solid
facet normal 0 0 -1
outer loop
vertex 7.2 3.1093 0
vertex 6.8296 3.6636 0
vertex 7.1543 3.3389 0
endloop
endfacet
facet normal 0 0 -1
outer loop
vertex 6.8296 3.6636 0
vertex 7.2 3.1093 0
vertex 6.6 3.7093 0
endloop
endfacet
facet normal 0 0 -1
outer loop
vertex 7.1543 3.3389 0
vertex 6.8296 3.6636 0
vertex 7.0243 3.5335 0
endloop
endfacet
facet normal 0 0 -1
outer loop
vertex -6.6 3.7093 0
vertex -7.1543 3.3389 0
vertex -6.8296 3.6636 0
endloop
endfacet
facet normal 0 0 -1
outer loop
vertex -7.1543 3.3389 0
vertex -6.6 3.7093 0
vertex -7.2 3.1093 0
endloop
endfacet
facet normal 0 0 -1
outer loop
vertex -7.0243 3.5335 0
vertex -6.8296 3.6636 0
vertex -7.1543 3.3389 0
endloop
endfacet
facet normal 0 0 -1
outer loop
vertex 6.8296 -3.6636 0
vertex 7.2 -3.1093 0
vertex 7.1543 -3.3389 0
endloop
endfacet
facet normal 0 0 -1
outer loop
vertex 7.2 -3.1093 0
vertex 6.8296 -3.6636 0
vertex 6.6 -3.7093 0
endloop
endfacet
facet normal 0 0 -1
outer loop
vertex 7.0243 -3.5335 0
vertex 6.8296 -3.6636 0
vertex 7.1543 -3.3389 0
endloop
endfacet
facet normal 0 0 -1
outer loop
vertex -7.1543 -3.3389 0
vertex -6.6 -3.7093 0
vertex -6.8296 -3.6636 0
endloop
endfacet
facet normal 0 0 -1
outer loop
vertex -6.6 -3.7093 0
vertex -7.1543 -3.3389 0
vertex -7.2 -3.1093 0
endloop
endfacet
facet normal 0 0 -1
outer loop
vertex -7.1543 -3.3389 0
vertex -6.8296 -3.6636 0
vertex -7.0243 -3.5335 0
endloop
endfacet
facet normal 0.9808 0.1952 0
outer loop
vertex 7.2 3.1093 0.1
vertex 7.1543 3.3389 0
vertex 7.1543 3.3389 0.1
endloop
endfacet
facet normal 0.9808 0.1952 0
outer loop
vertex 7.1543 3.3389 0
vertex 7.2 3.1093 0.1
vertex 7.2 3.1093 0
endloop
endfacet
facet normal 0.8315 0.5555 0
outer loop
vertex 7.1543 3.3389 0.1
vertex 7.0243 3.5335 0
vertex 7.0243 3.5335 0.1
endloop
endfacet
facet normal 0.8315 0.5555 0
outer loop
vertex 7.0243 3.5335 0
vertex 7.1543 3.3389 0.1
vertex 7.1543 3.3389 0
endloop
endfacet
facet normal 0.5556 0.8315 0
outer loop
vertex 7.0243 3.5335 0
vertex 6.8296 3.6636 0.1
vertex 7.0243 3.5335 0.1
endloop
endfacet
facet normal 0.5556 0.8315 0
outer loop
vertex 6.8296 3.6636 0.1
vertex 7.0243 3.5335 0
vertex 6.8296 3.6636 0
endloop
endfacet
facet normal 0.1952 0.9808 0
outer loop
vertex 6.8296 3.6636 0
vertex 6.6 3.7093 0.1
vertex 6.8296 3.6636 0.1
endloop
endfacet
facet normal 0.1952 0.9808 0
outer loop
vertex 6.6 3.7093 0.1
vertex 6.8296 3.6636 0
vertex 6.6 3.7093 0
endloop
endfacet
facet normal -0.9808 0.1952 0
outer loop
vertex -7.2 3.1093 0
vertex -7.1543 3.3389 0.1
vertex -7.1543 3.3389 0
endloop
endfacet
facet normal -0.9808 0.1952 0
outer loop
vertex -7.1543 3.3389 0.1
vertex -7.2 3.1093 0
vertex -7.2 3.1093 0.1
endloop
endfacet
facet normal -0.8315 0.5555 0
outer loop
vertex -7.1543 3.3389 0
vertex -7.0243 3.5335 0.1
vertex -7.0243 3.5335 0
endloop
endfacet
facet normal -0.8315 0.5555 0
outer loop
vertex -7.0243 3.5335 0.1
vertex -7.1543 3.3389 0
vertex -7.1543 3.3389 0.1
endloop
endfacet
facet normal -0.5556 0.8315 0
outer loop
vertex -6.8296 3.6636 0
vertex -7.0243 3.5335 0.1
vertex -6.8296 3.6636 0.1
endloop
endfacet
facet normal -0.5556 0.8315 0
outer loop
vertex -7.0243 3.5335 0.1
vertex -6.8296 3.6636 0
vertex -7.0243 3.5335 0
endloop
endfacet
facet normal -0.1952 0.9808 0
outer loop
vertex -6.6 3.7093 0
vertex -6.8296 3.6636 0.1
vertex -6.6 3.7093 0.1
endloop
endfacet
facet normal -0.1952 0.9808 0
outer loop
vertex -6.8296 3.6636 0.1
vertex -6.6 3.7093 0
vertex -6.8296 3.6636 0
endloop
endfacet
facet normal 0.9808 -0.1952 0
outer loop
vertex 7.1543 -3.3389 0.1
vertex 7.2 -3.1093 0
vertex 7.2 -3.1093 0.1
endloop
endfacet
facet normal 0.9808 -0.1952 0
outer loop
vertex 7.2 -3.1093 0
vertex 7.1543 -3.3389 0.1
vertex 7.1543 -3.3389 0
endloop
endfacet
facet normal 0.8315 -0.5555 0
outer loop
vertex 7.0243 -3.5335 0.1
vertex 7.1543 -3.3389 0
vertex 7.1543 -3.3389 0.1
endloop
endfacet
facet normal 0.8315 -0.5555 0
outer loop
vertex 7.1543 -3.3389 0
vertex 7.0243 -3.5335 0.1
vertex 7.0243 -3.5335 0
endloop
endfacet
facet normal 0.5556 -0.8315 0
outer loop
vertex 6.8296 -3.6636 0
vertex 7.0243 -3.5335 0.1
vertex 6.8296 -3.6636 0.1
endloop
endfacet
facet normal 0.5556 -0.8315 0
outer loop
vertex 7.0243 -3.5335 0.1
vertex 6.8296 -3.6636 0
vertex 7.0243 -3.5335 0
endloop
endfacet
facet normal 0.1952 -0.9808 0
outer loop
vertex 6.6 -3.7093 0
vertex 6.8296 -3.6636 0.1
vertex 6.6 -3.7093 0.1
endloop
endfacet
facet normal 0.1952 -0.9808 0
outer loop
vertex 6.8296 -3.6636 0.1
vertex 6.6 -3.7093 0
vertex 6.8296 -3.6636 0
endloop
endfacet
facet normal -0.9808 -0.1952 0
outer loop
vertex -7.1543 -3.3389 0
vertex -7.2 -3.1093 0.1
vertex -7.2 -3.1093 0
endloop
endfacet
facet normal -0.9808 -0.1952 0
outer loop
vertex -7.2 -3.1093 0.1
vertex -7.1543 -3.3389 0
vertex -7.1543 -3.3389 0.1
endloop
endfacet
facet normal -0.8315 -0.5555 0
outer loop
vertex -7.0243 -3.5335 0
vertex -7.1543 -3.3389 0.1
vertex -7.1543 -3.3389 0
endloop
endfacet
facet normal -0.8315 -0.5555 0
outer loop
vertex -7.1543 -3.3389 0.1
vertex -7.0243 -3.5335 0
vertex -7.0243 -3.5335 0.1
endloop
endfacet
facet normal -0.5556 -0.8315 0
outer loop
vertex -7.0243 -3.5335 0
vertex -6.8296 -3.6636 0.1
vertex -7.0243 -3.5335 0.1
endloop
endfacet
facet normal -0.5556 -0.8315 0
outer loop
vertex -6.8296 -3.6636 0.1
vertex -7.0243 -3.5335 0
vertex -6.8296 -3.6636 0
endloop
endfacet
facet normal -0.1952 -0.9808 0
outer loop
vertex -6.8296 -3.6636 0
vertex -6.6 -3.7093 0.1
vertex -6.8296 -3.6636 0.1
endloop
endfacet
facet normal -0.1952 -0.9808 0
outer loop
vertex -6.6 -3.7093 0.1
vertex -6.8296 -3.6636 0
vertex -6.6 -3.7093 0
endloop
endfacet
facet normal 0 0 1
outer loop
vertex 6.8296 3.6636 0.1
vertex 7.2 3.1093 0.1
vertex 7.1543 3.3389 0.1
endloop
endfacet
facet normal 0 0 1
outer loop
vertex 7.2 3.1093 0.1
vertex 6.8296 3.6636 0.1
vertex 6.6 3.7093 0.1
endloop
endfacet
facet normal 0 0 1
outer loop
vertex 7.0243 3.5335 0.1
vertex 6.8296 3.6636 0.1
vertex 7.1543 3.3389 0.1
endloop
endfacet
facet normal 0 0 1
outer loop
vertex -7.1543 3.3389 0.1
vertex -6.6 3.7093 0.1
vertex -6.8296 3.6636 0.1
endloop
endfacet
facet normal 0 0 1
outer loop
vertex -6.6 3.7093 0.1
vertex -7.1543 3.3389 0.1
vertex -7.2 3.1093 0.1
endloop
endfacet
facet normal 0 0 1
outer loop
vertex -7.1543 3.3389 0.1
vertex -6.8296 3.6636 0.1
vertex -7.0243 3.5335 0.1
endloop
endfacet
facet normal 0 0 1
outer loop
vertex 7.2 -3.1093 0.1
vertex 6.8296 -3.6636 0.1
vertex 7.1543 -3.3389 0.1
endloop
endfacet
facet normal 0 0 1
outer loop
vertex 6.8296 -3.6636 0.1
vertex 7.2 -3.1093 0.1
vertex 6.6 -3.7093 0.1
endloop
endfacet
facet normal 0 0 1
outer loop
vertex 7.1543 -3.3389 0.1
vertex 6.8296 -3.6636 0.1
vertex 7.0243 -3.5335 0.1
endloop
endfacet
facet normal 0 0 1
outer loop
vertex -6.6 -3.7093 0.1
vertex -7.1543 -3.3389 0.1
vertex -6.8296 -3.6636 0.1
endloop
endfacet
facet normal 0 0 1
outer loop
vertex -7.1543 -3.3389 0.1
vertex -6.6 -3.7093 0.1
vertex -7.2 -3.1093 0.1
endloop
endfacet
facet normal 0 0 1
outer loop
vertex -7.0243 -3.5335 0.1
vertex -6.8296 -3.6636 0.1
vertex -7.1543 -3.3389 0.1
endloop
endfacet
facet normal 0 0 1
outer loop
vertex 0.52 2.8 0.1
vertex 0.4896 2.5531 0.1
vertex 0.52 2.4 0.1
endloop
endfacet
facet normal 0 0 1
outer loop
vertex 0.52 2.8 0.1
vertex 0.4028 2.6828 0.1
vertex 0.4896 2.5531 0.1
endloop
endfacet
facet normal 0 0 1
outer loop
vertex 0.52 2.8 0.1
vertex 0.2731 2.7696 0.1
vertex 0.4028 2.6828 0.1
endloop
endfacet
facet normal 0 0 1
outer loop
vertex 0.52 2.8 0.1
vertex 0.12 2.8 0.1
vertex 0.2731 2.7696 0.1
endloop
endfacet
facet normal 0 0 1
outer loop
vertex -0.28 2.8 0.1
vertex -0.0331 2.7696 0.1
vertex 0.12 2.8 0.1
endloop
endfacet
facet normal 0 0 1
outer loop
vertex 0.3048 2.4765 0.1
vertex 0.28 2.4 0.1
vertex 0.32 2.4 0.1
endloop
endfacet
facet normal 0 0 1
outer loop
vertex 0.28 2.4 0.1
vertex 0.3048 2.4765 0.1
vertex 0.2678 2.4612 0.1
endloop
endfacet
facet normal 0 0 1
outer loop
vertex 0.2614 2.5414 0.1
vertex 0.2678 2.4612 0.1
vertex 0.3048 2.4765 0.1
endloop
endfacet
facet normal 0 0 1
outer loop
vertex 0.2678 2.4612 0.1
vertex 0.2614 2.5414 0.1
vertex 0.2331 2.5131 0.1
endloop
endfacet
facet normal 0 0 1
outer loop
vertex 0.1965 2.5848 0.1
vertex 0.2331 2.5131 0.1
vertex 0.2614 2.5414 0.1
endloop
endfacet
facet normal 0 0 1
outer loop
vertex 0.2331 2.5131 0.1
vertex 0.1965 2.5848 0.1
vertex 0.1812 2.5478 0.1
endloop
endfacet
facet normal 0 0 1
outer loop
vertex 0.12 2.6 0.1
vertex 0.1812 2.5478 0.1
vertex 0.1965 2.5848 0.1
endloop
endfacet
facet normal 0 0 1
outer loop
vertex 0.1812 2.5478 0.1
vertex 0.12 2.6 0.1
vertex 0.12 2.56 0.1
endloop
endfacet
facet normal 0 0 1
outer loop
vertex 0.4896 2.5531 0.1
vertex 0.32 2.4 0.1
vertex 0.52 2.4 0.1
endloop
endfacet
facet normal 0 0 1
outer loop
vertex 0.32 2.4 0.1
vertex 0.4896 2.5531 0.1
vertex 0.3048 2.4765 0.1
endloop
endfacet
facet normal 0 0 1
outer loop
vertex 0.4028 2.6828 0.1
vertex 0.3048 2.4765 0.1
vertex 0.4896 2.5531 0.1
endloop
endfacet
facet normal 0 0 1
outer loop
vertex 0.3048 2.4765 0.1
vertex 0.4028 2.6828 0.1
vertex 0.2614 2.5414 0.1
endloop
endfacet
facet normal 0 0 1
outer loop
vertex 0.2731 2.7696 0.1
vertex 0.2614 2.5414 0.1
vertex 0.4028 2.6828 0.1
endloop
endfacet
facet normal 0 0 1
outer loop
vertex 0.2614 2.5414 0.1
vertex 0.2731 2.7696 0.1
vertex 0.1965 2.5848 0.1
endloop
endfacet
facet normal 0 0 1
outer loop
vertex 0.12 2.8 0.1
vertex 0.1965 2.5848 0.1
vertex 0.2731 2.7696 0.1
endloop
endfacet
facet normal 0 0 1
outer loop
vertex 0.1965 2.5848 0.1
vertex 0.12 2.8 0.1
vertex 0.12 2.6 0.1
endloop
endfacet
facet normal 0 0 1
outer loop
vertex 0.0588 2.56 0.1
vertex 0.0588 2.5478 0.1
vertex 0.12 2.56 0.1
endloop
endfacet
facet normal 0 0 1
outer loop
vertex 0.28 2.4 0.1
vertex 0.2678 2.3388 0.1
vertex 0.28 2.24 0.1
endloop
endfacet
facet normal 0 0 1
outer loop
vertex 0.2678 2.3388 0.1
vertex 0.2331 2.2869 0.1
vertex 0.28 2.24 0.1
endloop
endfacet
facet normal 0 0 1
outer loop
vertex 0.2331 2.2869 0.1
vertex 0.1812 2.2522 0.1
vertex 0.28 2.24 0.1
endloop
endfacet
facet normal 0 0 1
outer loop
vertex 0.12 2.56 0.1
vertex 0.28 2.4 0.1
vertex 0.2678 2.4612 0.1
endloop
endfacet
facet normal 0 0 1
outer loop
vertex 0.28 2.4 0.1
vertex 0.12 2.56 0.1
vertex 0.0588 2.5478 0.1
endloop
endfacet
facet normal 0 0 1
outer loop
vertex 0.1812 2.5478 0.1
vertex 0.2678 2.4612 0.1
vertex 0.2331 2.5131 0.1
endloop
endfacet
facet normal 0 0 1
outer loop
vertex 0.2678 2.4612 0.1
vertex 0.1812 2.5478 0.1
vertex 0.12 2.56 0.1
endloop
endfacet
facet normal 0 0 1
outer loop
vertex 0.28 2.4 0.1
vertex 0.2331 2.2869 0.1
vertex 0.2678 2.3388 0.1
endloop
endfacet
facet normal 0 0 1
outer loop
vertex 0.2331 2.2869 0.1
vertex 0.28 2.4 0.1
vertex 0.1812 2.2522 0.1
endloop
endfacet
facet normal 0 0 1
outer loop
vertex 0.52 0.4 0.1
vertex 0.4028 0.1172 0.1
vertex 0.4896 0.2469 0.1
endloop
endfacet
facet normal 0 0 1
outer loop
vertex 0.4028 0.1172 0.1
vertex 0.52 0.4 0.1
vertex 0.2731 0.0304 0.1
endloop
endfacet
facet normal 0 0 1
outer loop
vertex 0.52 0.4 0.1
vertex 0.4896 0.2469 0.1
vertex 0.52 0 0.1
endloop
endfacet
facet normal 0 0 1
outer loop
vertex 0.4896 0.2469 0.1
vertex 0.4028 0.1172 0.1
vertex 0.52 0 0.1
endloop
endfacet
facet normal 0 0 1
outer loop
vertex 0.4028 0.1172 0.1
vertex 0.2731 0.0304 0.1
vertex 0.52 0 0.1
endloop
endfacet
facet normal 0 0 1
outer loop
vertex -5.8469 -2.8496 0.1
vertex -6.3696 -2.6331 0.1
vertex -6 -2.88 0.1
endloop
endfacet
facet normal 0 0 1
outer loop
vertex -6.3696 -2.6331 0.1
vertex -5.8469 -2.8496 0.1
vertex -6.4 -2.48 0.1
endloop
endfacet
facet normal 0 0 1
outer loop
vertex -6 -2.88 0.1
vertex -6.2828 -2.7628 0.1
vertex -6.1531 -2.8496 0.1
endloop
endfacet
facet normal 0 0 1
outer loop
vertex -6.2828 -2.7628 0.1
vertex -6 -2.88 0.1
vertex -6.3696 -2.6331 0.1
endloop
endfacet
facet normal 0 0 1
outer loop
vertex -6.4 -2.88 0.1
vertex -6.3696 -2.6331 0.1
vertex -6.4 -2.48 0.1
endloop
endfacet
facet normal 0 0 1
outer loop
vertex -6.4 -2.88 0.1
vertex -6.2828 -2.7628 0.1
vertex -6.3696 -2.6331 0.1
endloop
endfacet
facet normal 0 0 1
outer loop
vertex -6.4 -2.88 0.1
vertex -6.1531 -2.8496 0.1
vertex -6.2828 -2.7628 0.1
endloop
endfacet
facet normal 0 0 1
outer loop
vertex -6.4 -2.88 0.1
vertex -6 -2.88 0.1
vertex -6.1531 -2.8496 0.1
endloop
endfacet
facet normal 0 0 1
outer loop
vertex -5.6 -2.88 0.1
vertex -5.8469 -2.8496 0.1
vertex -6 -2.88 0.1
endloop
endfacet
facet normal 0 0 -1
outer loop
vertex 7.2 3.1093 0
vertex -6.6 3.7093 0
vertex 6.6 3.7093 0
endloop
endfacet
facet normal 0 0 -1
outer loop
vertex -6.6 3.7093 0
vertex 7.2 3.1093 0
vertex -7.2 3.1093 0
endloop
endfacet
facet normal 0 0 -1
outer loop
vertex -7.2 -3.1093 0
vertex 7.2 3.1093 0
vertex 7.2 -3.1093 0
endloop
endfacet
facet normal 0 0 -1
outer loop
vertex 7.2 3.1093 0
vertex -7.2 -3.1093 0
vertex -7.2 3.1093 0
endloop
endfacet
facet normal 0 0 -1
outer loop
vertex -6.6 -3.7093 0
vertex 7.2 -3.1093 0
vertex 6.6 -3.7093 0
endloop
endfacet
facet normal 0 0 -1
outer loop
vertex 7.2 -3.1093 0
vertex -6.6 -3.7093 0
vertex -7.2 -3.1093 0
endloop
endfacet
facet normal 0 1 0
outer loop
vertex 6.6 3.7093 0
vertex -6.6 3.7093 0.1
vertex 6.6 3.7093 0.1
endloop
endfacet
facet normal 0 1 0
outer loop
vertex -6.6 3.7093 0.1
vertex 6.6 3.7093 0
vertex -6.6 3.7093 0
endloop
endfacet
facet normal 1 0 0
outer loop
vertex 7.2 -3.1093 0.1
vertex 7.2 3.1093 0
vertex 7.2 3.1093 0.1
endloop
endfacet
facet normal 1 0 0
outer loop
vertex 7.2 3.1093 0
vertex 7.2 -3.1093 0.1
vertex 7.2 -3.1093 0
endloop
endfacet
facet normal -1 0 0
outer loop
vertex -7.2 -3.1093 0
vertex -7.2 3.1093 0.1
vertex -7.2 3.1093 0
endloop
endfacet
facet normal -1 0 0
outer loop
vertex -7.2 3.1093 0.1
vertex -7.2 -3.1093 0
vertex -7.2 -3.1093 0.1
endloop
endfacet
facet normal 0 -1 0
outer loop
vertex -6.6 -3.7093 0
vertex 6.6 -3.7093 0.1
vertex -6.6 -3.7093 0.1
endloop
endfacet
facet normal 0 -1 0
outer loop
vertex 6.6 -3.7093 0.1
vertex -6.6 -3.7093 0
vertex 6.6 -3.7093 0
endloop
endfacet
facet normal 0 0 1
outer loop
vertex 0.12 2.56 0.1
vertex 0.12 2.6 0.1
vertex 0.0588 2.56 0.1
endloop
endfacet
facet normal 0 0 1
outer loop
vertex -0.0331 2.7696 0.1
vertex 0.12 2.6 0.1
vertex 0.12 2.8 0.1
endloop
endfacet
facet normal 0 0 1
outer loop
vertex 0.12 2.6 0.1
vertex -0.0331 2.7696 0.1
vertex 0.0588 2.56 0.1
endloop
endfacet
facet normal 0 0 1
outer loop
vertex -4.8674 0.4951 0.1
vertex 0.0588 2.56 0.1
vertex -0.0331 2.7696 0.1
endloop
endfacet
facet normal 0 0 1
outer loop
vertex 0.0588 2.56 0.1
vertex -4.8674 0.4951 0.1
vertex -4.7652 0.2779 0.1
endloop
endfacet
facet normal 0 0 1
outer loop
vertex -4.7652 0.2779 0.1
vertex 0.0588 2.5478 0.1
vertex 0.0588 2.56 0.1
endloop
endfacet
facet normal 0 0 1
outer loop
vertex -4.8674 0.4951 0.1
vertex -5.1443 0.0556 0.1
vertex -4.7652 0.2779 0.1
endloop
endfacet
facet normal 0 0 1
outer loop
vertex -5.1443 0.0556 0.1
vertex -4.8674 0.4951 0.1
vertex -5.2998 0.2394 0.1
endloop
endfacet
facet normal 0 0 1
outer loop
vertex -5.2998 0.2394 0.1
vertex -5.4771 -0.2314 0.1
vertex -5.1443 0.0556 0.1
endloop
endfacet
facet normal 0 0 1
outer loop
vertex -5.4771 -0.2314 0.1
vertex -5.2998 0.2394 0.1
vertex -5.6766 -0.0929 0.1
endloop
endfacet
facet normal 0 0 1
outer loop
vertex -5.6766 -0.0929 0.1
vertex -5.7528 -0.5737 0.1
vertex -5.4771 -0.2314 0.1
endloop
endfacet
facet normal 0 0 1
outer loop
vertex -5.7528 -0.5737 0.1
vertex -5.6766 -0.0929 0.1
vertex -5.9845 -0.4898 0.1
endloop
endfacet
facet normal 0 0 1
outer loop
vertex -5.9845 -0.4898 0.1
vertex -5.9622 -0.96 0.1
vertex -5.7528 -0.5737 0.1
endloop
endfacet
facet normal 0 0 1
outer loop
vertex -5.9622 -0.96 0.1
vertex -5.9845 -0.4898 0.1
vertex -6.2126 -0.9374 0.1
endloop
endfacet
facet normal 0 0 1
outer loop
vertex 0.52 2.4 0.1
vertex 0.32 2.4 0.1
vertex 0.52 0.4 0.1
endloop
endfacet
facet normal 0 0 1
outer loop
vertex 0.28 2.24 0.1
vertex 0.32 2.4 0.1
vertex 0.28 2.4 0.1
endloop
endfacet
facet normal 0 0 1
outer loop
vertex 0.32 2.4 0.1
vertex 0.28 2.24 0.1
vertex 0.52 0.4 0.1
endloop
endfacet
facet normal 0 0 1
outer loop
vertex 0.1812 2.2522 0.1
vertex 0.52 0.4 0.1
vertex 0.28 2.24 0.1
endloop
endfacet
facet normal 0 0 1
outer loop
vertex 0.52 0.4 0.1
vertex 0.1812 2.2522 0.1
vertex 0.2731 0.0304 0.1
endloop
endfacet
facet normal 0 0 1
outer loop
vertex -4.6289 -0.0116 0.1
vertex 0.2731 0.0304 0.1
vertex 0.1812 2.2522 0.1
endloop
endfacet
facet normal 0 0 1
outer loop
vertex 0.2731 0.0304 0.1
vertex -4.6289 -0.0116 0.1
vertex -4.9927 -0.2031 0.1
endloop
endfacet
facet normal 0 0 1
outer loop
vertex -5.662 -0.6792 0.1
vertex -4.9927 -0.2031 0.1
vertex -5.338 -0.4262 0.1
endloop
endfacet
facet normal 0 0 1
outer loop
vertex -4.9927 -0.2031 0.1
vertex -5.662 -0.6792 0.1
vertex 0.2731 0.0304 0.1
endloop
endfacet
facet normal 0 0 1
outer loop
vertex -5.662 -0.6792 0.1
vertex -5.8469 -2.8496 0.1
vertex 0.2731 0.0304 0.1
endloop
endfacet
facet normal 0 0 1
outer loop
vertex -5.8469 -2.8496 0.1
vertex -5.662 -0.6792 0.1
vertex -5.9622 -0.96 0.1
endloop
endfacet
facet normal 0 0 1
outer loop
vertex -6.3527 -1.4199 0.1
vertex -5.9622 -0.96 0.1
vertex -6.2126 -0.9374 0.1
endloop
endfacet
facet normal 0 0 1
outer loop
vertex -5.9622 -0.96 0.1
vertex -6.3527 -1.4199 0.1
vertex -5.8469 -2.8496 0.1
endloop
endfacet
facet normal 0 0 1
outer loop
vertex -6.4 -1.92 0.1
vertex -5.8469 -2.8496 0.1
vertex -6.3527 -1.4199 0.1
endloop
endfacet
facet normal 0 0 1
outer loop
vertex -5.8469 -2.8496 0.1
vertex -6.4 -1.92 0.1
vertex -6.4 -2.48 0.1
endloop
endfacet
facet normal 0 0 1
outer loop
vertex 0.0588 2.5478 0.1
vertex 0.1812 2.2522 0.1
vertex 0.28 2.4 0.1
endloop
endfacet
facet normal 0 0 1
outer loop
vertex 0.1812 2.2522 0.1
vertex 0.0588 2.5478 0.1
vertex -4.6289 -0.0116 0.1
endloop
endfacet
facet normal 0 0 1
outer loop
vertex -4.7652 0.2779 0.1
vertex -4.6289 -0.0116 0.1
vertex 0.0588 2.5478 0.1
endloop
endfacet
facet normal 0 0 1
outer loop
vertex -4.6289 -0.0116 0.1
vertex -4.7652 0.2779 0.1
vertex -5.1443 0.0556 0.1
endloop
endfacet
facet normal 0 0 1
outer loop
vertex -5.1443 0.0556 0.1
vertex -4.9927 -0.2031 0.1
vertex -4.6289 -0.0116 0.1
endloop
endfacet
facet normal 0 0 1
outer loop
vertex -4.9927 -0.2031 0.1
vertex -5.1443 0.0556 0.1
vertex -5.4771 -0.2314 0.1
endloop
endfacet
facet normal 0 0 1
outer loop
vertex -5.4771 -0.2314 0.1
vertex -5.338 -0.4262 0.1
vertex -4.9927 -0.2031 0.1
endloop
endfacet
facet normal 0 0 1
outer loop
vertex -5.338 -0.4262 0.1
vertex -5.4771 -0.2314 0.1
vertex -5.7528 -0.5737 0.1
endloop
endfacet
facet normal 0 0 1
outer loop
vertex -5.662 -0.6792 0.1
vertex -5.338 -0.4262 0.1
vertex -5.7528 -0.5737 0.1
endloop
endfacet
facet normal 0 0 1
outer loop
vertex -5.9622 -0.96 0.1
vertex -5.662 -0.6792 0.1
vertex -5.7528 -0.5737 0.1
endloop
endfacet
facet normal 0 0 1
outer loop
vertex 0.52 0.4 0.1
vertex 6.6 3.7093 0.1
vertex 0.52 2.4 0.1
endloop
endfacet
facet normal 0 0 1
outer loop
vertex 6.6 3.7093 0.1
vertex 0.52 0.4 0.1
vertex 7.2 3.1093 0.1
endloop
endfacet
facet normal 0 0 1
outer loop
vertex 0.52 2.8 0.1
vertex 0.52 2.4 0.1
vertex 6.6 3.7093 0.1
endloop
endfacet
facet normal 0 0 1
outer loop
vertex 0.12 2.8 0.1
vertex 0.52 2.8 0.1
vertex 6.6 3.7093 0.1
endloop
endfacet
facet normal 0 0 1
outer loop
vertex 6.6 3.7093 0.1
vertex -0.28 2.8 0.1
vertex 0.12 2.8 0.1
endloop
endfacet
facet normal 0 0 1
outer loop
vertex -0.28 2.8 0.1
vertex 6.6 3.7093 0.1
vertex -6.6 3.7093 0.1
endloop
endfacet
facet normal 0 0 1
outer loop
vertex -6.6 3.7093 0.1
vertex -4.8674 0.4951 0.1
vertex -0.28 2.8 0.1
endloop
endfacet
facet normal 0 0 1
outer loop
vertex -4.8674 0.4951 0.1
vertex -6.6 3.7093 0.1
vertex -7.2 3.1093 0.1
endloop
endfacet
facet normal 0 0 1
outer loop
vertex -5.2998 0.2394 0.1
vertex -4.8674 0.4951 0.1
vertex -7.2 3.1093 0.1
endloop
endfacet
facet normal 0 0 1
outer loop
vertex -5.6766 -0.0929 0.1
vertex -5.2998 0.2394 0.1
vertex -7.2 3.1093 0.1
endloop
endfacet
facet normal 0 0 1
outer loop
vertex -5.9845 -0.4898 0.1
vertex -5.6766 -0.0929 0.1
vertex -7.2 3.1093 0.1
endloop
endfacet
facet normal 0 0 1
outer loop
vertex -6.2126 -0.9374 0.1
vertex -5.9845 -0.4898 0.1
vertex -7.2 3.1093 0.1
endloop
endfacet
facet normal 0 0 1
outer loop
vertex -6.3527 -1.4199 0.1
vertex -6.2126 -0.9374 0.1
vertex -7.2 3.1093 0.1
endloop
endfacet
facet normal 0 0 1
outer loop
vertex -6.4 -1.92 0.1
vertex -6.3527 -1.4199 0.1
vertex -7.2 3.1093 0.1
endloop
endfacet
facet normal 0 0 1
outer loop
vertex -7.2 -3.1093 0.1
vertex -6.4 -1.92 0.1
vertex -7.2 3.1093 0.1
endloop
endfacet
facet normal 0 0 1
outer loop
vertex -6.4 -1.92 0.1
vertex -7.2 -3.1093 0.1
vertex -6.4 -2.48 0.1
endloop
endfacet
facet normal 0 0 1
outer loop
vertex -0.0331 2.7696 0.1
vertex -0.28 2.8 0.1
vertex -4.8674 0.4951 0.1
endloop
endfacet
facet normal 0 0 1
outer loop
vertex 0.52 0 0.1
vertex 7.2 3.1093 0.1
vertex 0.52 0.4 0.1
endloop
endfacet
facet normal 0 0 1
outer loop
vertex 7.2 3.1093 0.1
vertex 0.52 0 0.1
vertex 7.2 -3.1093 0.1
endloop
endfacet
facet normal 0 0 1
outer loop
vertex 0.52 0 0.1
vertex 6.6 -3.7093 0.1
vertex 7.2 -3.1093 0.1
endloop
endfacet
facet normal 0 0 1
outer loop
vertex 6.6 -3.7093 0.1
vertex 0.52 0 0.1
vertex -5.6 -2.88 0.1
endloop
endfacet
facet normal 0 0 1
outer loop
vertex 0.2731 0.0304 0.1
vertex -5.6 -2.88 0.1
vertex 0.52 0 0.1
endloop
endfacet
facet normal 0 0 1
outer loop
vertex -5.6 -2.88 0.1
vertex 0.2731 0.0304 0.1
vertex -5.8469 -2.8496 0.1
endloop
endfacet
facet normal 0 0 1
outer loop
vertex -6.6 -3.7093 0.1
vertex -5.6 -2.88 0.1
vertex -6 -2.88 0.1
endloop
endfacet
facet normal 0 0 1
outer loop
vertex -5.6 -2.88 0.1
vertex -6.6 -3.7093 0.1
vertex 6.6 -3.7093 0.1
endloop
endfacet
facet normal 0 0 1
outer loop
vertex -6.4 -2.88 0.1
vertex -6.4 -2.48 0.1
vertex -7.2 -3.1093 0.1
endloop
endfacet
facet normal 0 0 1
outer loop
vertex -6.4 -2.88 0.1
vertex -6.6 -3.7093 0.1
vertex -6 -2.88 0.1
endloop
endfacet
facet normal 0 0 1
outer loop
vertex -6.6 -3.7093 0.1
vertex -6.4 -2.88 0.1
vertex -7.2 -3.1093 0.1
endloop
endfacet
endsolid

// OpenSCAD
use <../lib.scad>
use <6141875j.scad>
$fa=1; $fs=0.2;
function ldraw_lib__6141875l(realsolid=false) = [
// 0 Sticker  0.9 x  1.8 with Black Air Vent on Blue Background Left
// 0 Name: 6141875l.dat
// 0 Author: Massimo Maso [Sirio]
// 0 !LDRAW_ORG Part UPDATE 2022-06
// 0 !LICENSE Licensed under CC BY 2.0 and CC BY 4.0 : see CAreadme.txt
// 
// 0 BFC CERTIFY CCW
  [0,"BFC","CERTIFY"],
  [0,"BFC","CCW"],
// 
// 0 !KEYWORDS Bricklink 75875stk01, Brickowl 53567, F-150, Ford, Raptor
// 0 !KEYWORDS Rebrickable 24760, Set 75875, Speed Champions
// 
// 0 !HISTORY 2022-12-20 [PTadmin] Official Update 2022-06
// 
// 
// 1 16 0 0 0 -1 0 0 0 1 0 0 0 1 6141875j.dat
  [1,16,0,0,0,-1,0,0,0,1,0,0,0,1, ldraw_lib__6141875j(realsolid)],
];
module ldraw_lib__6141875l(step=0, col=false, unit=2/5, alt=false, line=0.2, solid=!$preview)
    makepoly(ldraw_lib__6141875l(solid), step=step, col=col, unit=unit, alt=alt, line=line, solid=solid);
ldraw_lib__6141875l(line=0.2);
